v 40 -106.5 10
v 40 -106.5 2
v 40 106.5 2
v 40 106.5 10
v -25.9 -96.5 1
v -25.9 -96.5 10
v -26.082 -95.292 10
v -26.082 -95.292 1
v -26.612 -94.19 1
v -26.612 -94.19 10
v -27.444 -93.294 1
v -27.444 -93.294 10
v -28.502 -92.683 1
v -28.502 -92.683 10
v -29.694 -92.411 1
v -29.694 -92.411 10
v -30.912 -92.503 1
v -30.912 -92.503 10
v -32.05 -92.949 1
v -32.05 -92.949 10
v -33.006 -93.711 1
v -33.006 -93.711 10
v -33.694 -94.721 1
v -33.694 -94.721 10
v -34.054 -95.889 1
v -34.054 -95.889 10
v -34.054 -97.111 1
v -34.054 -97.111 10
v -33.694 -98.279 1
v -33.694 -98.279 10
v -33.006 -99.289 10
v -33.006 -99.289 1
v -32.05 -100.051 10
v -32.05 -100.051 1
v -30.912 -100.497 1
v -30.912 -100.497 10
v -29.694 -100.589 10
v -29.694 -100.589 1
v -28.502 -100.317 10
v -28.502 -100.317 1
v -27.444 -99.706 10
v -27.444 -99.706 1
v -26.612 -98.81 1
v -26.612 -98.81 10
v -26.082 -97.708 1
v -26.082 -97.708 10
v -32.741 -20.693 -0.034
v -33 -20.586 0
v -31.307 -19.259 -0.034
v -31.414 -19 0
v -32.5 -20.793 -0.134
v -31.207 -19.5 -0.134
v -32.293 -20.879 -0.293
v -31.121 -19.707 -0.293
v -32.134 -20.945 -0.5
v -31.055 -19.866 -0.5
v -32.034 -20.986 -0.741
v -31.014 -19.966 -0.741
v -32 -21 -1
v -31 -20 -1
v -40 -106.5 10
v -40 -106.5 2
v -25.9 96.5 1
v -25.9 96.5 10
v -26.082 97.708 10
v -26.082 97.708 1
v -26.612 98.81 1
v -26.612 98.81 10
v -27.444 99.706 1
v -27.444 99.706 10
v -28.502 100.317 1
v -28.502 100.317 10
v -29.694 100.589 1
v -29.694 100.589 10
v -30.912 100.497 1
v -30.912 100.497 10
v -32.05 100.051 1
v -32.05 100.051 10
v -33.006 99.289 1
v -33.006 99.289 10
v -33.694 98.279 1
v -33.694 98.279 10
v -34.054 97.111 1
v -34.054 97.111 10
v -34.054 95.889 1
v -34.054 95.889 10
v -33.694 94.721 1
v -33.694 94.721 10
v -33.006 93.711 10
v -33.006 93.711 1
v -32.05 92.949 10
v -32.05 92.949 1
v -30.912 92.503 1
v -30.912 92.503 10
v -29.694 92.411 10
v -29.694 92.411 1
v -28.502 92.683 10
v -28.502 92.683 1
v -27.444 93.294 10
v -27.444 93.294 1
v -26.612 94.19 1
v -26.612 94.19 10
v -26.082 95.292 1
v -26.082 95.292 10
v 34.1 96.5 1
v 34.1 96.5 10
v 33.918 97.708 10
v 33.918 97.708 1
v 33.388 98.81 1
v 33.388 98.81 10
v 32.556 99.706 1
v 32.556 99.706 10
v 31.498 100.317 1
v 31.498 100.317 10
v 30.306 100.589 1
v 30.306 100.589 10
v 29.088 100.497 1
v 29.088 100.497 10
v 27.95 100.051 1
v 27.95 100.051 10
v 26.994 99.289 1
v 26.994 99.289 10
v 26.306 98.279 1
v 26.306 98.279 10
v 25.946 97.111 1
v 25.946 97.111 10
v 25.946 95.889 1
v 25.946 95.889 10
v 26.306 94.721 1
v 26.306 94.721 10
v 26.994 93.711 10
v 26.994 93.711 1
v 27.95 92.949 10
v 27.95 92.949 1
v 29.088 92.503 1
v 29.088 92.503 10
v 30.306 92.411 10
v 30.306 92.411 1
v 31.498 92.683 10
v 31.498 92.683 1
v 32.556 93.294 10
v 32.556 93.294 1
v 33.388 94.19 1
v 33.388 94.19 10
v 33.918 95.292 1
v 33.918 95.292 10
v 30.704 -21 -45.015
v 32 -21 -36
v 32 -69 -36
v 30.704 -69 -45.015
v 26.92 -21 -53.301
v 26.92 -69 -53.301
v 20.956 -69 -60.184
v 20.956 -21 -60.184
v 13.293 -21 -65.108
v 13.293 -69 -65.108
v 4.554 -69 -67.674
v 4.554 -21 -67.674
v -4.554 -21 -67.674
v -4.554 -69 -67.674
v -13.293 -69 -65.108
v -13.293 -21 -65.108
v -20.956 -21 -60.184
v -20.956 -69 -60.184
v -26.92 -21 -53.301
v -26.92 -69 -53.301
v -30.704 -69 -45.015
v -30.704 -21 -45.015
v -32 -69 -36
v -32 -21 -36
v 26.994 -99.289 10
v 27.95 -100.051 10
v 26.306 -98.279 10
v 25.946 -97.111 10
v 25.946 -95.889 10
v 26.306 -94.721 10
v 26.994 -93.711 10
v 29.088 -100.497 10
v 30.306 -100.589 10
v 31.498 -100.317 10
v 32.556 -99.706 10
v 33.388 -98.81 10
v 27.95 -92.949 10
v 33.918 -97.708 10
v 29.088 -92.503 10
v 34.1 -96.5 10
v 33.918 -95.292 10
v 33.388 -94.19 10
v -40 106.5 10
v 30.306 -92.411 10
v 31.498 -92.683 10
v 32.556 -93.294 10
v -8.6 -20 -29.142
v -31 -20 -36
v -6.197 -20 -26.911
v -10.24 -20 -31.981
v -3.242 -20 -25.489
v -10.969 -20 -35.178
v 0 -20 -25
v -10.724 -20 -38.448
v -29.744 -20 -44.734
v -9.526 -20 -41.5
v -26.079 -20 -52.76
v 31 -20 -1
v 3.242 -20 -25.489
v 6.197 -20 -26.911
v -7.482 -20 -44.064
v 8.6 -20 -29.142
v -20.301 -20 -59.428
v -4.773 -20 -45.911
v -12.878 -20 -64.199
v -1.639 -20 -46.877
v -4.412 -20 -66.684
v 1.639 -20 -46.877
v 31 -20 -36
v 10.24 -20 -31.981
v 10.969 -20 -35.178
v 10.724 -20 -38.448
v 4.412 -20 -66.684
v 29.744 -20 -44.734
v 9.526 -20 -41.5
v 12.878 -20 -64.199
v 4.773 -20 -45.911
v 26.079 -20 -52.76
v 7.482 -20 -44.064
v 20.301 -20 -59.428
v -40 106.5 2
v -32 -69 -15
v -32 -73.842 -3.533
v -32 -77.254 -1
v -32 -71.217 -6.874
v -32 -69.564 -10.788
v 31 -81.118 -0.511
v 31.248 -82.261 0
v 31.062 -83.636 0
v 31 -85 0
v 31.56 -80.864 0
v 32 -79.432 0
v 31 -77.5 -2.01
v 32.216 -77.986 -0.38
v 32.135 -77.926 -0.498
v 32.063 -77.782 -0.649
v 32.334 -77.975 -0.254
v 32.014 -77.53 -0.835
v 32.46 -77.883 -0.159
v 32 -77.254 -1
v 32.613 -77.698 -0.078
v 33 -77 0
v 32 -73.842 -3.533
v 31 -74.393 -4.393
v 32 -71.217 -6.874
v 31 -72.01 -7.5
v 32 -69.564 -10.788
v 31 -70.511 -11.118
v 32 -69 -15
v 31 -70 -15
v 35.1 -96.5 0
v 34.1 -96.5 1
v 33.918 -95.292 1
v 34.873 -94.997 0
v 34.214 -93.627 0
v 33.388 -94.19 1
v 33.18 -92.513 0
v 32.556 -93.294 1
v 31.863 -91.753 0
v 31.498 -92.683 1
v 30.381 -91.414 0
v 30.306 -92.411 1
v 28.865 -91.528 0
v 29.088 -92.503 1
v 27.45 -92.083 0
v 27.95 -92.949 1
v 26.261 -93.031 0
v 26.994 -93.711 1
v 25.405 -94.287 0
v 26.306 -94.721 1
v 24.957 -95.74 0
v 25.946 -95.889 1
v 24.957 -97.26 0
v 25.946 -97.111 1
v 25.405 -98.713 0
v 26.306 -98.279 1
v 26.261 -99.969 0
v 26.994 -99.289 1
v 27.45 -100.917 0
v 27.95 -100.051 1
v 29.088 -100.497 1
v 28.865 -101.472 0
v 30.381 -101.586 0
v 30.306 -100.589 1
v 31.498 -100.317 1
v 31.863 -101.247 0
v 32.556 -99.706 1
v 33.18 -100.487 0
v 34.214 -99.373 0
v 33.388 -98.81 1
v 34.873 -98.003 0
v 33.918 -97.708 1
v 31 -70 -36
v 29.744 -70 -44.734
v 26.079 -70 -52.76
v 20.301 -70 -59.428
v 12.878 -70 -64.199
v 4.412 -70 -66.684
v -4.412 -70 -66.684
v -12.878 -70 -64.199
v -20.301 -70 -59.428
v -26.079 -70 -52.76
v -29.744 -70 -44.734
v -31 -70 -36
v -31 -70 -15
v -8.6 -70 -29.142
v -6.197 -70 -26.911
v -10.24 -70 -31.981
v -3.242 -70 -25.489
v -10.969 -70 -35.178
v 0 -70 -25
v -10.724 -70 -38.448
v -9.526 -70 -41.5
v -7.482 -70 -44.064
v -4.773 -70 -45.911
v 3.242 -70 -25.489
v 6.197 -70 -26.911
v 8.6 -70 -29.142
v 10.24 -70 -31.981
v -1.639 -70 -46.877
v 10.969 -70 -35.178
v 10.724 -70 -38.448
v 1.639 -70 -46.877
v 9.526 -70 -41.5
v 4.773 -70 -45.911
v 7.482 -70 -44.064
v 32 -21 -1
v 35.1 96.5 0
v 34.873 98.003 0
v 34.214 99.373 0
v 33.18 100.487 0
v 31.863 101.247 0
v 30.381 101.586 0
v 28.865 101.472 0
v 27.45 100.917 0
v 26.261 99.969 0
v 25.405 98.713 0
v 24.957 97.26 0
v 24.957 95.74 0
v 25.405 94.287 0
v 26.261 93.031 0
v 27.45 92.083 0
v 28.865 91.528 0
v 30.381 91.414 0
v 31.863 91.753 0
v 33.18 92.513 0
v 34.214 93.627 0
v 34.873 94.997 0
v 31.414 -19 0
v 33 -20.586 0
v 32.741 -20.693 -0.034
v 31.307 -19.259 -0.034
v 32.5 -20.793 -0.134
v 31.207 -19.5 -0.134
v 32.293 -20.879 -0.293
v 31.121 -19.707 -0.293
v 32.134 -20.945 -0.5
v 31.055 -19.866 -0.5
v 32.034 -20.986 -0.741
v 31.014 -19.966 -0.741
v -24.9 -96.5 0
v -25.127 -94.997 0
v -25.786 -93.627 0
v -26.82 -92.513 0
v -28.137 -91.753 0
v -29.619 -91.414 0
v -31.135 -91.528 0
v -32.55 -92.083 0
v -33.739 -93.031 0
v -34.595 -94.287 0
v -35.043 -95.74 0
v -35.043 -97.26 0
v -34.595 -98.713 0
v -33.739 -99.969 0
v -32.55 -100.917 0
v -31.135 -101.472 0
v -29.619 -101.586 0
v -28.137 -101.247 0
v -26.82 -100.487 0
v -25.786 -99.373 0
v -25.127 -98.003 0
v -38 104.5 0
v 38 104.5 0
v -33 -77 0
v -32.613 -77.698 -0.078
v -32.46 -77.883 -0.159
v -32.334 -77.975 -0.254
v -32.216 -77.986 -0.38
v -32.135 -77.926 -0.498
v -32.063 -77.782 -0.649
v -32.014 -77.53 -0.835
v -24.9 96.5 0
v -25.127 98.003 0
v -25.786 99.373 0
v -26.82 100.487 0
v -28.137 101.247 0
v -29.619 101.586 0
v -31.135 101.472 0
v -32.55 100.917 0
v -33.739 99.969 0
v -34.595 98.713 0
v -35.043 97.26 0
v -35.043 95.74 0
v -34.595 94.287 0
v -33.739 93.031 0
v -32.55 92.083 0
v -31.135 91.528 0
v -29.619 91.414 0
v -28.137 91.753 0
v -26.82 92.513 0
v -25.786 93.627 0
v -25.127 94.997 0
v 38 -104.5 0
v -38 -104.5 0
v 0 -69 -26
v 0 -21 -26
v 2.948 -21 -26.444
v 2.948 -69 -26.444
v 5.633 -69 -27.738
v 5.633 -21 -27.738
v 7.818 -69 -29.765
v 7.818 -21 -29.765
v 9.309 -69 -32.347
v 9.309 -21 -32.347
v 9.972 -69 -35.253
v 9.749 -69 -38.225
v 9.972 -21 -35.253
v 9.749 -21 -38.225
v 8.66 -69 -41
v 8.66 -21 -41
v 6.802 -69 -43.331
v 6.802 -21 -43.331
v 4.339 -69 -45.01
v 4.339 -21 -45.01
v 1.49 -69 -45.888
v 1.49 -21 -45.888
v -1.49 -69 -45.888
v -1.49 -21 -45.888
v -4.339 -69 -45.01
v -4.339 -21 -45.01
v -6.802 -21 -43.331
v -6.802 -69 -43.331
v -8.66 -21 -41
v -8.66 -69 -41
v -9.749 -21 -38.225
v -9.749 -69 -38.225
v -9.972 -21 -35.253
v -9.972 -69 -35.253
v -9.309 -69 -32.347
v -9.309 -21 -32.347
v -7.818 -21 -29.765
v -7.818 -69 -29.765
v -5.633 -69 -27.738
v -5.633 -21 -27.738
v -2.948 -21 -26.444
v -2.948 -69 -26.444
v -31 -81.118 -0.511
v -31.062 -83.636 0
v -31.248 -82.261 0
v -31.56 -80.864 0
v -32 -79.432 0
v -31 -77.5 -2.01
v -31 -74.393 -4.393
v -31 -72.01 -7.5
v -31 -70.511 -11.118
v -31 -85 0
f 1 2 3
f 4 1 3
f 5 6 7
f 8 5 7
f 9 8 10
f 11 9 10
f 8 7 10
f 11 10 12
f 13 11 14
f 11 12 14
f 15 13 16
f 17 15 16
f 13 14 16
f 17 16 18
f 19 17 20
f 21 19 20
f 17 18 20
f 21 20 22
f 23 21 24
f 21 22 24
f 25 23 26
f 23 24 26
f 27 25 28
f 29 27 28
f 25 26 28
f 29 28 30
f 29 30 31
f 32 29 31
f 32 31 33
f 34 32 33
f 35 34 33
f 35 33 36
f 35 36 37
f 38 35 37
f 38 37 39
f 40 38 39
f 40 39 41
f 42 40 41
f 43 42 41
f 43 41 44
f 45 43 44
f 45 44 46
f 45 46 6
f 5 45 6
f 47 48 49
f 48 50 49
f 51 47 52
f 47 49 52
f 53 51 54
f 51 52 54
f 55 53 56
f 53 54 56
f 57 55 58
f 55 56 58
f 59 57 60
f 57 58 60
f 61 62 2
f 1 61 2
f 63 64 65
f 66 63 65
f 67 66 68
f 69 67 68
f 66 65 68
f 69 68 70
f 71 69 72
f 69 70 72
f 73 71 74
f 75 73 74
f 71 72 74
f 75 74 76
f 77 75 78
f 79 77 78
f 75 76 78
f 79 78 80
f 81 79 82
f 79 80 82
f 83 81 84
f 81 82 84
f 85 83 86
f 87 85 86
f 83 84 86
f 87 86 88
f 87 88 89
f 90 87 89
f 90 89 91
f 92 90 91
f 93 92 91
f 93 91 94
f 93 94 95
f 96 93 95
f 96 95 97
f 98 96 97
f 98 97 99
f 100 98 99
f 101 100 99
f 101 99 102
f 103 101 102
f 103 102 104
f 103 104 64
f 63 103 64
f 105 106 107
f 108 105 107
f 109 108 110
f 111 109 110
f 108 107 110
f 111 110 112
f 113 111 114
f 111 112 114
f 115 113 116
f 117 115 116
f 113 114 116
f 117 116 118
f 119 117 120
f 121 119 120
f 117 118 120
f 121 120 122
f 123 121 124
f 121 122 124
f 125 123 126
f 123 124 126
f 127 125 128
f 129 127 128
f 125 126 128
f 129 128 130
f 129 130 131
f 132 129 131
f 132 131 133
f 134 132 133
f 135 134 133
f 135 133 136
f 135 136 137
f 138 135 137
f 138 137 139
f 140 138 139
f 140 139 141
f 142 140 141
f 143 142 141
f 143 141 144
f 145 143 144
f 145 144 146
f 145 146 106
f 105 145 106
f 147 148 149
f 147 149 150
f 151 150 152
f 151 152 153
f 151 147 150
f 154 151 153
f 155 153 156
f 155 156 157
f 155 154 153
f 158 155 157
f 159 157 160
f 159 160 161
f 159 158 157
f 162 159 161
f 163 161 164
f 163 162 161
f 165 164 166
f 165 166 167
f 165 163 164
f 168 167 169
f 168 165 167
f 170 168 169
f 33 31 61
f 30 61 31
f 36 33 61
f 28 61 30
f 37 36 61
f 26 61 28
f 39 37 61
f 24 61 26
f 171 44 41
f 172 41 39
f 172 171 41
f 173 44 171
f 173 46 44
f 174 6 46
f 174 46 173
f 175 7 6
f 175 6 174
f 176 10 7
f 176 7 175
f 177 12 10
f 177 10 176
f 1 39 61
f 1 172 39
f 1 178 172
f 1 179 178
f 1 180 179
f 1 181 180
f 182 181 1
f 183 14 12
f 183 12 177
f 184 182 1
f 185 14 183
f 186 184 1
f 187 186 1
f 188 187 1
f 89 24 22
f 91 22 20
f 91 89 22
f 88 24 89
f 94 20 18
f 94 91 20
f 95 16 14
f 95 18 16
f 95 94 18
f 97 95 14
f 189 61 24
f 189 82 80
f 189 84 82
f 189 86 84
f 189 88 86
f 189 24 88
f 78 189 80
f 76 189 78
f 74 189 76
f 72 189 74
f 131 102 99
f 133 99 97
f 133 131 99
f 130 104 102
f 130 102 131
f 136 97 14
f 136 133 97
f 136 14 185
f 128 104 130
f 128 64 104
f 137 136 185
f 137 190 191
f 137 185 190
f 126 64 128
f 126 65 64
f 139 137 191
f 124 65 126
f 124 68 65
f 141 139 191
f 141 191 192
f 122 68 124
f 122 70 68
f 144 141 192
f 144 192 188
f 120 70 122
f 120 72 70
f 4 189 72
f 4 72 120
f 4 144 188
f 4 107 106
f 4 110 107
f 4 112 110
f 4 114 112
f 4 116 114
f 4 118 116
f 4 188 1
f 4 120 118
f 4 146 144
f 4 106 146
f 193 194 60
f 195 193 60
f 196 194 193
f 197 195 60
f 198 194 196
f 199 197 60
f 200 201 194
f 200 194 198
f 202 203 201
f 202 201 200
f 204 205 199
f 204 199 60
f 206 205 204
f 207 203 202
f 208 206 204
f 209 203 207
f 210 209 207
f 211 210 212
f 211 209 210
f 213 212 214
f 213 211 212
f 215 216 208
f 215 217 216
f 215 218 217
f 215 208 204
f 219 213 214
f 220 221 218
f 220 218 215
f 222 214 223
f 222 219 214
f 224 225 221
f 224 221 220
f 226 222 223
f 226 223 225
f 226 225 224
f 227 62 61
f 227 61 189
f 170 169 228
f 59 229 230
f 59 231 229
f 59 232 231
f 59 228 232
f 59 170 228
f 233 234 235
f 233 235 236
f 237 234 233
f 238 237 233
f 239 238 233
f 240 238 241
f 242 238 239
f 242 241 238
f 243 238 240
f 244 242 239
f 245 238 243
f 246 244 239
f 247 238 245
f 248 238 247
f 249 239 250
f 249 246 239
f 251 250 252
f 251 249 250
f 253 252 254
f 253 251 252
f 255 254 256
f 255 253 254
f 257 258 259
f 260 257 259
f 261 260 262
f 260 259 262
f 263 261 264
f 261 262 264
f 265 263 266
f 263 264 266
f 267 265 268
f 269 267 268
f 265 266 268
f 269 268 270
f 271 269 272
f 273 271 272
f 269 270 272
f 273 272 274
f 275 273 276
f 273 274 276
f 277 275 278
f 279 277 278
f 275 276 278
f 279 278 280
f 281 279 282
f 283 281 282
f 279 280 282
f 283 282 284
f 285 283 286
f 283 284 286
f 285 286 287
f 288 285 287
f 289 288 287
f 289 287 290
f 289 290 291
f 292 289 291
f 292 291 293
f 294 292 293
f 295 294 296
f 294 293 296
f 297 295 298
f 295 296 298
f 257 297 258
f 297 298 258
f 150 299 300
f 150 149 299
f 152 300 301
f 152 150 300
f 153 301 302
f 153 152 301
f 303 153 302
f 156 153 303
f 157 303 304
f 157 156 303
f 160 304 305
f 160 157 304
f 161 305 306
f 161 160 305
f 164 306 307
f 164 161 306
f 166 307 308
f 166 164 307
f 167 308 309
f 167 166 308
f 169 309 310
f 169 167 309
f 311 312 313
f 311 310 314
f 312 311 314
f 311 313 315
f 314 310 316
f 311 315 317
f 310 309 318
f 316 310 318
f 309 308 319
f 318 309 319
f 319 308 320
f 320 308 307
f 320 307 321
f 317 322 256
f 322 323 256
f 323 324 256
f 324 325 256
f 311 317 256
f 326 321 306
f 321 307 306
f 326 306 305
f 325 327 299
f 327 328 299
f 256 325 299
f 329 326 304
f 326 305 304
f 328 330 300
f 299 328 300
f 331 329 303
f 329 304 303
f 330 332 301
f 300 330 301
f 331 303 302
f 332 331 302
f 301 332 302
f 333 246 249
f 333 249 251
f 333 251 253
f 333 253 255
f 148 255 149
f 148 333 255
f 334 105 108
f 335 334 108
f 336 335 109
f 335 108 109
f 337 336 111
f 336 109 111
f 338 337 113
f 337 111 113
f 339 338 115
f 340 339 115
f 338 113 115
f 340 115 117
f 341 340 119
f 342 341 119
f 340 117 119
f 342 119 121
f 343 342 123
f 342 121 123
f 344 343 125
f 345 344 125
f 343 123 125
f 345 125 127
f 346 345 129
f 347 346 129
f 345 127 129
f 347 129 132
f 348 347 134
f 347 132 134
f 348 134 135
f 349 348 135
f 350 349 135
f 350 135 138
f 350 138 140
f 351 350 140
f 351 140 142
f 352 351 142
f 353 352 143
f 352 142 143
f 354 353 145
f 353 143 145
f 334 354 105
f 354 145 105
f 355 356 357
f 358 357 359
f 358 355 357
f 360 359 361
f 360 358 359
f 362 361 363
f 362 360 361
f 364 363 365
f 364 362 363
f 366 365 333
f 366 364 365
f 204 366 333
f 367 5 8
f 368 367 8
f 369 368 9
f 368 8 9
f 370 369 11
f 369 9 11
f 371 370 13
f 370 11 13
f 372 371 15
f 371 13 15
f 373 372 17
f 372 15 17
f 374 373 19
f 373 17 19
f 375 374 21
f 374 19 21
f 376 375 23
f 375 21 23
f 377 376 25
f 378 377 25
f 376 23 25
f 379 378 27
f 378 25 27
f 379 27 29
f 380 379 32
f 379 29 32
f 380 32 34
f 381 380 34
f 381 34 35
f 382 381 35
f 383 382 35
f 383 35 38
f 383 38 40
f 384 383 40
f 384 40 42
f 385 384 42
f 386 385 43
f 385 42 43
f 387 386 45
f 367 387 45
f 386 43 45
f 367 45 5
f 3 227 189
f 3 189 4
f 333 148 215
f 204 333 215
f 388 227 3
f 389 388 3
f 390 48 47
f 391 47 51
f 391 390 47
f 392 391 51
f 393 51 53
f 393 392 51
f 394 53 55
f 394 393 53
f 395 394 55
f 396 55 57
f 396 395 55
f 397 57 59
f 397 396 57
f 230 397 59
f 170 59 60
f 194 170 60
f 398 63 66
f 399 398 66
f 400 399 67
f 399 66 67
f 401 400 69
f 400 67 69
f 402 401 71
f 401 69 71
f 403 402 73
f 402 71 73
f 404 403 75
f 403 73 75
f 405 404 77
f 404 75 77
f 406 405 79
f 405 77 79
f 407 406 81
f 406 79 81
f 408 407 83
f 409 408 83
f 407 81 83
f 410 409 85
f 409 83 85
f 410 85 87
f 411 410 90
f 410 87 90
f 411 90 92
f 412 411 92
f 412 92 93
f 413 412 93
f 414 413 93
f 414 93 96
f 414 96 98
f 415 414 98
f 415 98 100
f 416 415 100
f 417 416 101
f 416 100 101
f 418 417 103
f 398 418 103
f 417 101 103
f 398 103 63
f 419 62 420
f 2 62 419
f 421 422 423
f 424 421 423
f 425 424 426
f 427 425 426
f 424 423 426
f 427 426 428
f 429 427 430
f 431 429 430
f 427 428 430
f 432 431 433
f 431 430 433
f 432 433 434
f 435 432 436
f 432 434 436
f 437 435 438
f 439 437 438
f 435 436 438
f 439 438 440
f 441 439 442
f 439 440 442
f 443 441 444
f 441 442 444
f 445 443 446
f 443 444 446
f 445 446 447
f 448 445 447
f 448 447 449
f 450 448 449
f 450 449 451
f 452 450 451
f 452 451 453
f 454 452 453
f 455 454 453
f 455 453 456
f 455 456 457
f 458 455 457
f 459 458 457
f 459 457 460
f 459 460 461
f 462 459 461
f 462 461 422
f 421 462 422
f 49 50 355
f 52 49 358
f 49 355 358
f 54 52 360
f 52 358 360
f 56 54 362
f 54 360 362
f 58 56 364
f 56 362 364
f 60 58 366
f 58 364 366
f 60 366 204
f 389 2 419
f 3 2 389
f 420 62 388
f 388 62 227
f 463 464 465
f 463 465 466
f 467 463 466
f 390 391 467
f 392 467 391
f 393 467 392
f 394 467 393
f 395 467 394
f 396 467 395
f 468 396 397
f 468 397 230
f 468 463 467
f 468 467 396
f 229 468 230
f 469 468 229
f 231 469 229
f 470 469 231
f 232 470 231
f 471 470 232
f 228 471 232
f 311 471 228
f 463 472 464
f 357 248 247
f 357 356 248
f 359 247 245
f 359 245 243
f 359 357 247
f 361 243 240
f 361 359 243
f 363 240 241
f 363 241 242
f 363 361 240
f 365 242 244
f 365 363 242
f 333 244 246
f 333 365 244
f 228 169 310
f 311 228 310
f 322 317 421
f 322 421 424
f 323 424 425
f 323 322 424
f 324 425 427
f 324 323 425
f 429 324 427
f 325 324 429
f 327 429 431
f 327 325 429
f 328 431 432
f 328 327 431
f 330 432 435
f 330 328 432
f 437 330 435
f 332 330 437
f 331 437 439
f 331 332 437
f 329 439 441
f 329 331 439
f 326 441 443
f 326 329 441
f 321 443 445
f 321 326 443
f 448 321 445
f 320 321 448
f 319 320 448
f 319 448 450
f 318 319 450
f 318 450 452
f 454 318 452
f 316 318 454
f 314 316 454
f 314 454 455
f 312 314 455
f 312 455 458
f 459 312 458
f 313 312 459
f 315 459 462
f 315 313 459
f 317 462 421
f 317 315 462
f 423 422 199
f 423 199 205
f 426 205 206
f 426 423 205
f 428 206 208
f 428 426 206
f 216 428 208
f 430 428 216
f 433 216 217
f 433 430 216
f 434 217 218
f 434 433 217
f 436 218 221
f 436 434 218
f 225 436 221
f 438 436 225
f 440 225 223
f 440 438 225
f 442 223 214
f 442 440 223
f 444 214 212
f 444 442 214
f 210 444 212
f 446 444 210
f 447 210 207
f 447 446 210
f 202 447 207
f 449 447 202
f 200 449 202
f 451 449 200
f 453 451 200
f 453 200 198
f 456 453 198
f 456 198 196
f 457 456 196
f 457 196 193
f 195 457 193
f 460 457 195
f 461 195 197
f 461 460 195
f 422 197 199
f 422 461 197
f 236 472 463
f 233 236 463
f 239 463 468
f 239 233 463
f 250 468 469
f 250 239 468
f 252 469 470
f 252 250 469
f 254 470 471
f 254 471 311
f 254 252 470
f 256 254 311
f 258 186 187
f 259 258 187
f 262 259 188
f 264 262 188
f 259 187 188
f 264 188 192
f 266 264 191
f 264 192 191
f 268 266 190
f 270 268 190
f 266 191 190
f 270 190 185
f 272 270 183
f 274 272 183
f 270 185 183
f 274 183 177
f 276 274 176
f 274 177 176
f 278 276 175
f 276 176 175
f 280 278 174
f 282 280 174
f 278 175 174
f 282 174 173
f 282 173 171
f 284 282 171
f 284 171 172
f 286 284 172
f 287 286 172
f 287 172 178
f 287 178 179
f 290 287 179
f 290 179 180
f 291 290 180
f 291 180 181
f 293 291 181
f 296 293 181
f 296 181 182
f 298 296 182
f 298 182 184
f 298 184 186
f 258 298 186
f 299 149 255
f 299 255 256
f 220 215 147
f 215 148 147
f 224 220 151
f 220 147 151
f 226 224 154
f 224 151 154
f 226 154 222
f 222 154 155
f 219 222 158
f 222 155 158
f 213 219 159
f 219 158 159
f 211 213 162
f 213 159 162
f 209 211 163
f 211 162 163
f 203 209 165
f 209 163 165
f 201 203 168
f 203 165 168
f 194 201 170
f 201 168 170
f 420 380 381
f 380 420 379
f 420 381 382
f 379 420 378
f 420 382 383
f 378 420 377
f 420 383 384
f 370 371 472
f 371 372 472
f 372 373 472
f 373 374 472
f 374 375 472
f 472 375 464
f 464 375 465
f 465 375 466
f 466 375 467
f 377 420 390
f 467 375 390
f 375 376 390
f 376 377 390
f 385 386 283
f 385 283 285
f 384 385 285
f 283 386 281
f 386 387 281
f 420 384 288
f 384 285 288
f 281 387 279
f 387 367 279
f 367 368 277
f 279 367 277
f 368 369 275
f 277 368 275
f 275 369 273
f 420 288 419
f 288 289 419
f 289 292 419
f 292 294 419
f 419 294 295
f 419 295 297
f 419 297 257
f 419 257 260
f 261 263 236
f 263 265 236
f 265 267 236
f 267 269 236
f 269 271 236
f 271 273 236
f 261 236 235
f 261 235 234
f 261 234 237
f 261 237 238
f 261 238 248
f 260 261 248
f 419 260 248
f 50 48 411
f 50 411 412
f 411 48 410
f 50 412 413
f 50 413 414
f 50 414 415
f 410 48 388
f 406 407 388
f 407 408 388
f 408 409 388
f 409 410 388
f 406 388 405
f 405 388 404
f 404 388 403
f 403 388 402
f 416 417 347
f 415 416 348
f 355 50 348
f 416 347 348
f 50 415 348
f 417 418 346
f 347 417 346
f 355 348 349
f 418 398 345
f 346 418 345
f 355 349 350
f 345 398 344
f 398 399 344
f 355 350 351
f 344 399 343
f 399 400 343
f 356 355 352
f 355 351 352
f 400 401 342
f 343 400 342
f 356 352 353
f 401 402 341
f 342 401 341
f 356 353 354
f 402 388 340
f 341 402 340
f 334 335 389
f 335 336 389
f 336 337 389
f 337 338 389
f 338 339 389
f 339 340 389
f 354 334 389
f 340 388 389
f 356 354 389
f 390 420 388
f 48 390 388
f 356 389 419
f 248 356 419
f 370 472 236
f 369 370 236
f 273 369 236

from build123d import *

# Parameters (mm, degrees)
SKETCH1_W                  = 80
SKETCH1_H                  = 213
BOSS_EXTRUDE1_DEPTH        = 10
BOSS_EXTRUDE2_START        = -20
BOSS_EXTRUDE2_DEPTH        = 50
FILLET1_R                  = 15
SKETCH3_R                  = 10
CUT_EXTRUDE1_DEPTH         = 150.084707465
CHAMFER1_SIZE              = 1
F_8_2_8_2_DIAMETER_HOLE1_D = 8.2
CHAMFER2_SIZE              = 2
CHAMFER3_SIZE              = 1
FILLET2_R                  = 1


with BuildPart() as part:
    # Sketch1 → Boss-Extrude1 (new body)
    with BuildSketch(Plane.XY):
        Rectangle(SKETCH1_W, SKETCH1_H)
    extrude(amount=BOSS_EXTRUDE1_DEPTH)

    # Sketch2 → Boss-Extrude2 (add)
    with BuildSketch(Plane(origin=(0, 0, 0), x_dir=(1, 0, 0), z_dir=(0, 1, 0)).offset(BOSS_EXTRUDE2_START)):
        with BuildLine():
            Line((-32, 36), (-32, 0))
            Line((-32, 0), (32, 0))
            Line((32, 0), (32, 36))
            ThreePointArc((32, 36), (0, 68), (-32, 36))
        make_face()
    extrude(amount=-BOSS_EXTRUDE2_DEPTH)

    # Fillet1
    fillet1_edges = [part.edges().sort_by_distance(p)[0] for p in [
        (0, -70, 0),
    ]]
    fillet(fillet1_edges, radius=FILLET1_R)

    # Sketch3 → Cut-Extrude1 (cut, through all)
    with BuildSketch(Plane(origin=(0, -20, 0), x_dir=(1, 0, 0), z_dir=(0, 1, 0))):
        with Locations(Location((0, 36, 0), (0, 0, 270))):
            Circle(SKETCH3_R)
    extrude(amount=-CUT_EXTRUDE1_DEPTH, mode=Mode.SUBTRACT)

    # Chamfer1
    # the kernel refuses this chamfer: 1 mm, written as the material it takes off along each edge
    with BuildSketch(Plane(origin=(0, -70, -36), x_dir=(1, 0, 0), z_dir=(0, 0, 1))) as chamfer1_piece_1:
        Polygon((32 - CHAMFER1_SIZE, 0), (32, CHAMFER1_SIZE), (32, 0), align=None)
    revolve(axis=Axis((0, -70, -36), (0, 1, 0)), revolution_arc=180, mode=Mode.SUBTRACT)
    with BuildSketch(Plane(origin=(-32, -70, -36), x_dir=(-0.027495876610589196, 0.9996219169112968, 0), z_dir=(0, 0, 1)), Plane(origin=(32, -70, -15), x_dir=(0.027495876610589196, 0.9996219169112968, 0), z_dir=(0, 0, -1))) as chamfer1_piece_2:
        Polygon((CHAMFER1_SIZE * 0.999621916911, -CHAMFER1_SIZE * 0.0274958766106), (-CHAMFER1_SIZE * 0.0274958766106, -CHAMFER1_SIZE * 0.999621916911), (0, 0), align=None)
    extrude(amount=21, mode=Mode.SUBTRACT)
    with BuildSketch(Plane(origin=(0, -20, -36), x_dir=(1, 0, 0), z_dir=(0, 0, 1))) as chamfer1_piece_3:
        Polygon((32 - CHAMFER1_SIZE, 0), (32, -CHAMFER1_SIZE), (32, 0), align=None)
    revolve(axis=Axis((0, -20, -36), (0, 1, 0)), revolution_arc=180, mode=Mode.SUBTRACT)
    with BuildSketch(Plane(origin=(-32, -20, -36), x_dir=(-0.0274958766105891, -0.9996219169112968, 0), z_dir=(0, 0, 1)), Plane(origin=(32, -20, 0), x_dir=(0.0274958766105891, -0.9996219169112968, 0), z_dir=(0, 0, -1))) as chamfer1_piece_4:
        Polygon((CHAMFER1_SIZE * 0.999621916911, CHAMFER1_SIZE * 0.0274958766106), (-CHAMFER1_SIZE * 0.0274958766106, CHAMFER1_SIZE * 0.999621916911), (0, 0), align=None)
    extrude(amount=36, mode=Mode.SUBTRACT)
    with BuildSketch(Plane(origin=(32, -85, -15), x_dir=(0, -0.17067472761230248, 0.9853274264702401), z_dir=(0, -0.9853274264702401, -0.17067472761230248))) as chamfer1_piece_5_section:
        Polygon((15, CHAMFER1_SIZE), (15 + CHAMFER1_SIZE, 0), (15, 0), align=None)
    chamfer1_piece_5 = revolve(axis=Axis((32, -85, -15), (-1, 0, 0)), revolution_arc=99.827051452, mode=Mode.PRIVATE)
    chamfer1_piece_5 = split(chamfer1_piece_5, bisect_by=Plane(origin=(31.514748262, -74.050273487, 0), z_dir=(0, 0, -1)), keep=Keep.TOP, mode=Mode.PRIVATE)
    add(chamfer1_piece_5, mode=Mode.SUBTRACT)
    with BuildSketch(Plane(origin=(-32, -85, -15), x_dir=(0, -0.17067472761230248, 0.9853274264702401), z_dir=(0, -0.9853274264702401, -0.17067472761230248))) as chamfer1_piece_6_section:
        Polygon((15 + CHAMFER1_SIZE, 0), (15, -CHAMFER1_SIZE), (15, 0), align=None)
    chamfer1_piece_6 = revolve(axis=Axis((-32, -85, -15), (-1, 0, 0)), revolution_arc=99.827051452, mode=Mode.PRIVATE)
    chamfer1_piece_6 = split(chamfer1_piece_6, bisect_by=Plane(origin=(-31.514748262, -74.050273487, 0), z_dir=(0, 0, -1)), keep=Keep.TOP, mode=Mode.PRIVATE)
    add(chamfer1_piece_6, mode=Mode.SUBTRACT)

    # Ø8.2 (8.2) Diameter Hole1 (through all)
    with Locations(Plane(origin=(0, 0, 0), x_dir=(-1, 0, 0), z_dir=(0, 0, -1))):
        with Locations((30, -96.5), (-30, 96.5), (-30, -96.5), (30, 96.5)):
            Hole(F_8_2_8_2_DIAMETER_HOLE1_D / 2)

    # Chamfer2
    chamfer2_edges = [part.edges().sort_by_distance(p)[0] for p in [
        (0, 106.5, 0),
        (40, 0, 0),
        (0, -106.5, 0),
        (-40, 0, 0),
    ]]
    chamfer(chamfer2_edges, length=CHAMFER2_SIZE)

    # Chamfer3
    chamfer3_edges = [part.edges().sort_by_distance(p)[0] for p in [
        (25.9, -96.5, 0),
        (25.9, 96.5, 0),
        (-34.1, -96.5, 0),
        (0, -70, -46),
        (0, -20, -46),
        (-34.1, 96.5, 0),
    ]]
    chamfer(chamfer3_edges, length=CHAMFER3_SIZE)

    # Fillet2
    fillet2_edges = [part.edges().sort_by_distance(p)[0] for p in [
        (-32, -50.216117819, 0),
        (32, -50.216117819, 0),
        (0, -20, 0),
        (-31.5, -20.5, 0),
        (31.5, -20.5, 0),
    ]]
    fillet(fillet2_edges, radius=FILLET2_R)


solid = part.part
